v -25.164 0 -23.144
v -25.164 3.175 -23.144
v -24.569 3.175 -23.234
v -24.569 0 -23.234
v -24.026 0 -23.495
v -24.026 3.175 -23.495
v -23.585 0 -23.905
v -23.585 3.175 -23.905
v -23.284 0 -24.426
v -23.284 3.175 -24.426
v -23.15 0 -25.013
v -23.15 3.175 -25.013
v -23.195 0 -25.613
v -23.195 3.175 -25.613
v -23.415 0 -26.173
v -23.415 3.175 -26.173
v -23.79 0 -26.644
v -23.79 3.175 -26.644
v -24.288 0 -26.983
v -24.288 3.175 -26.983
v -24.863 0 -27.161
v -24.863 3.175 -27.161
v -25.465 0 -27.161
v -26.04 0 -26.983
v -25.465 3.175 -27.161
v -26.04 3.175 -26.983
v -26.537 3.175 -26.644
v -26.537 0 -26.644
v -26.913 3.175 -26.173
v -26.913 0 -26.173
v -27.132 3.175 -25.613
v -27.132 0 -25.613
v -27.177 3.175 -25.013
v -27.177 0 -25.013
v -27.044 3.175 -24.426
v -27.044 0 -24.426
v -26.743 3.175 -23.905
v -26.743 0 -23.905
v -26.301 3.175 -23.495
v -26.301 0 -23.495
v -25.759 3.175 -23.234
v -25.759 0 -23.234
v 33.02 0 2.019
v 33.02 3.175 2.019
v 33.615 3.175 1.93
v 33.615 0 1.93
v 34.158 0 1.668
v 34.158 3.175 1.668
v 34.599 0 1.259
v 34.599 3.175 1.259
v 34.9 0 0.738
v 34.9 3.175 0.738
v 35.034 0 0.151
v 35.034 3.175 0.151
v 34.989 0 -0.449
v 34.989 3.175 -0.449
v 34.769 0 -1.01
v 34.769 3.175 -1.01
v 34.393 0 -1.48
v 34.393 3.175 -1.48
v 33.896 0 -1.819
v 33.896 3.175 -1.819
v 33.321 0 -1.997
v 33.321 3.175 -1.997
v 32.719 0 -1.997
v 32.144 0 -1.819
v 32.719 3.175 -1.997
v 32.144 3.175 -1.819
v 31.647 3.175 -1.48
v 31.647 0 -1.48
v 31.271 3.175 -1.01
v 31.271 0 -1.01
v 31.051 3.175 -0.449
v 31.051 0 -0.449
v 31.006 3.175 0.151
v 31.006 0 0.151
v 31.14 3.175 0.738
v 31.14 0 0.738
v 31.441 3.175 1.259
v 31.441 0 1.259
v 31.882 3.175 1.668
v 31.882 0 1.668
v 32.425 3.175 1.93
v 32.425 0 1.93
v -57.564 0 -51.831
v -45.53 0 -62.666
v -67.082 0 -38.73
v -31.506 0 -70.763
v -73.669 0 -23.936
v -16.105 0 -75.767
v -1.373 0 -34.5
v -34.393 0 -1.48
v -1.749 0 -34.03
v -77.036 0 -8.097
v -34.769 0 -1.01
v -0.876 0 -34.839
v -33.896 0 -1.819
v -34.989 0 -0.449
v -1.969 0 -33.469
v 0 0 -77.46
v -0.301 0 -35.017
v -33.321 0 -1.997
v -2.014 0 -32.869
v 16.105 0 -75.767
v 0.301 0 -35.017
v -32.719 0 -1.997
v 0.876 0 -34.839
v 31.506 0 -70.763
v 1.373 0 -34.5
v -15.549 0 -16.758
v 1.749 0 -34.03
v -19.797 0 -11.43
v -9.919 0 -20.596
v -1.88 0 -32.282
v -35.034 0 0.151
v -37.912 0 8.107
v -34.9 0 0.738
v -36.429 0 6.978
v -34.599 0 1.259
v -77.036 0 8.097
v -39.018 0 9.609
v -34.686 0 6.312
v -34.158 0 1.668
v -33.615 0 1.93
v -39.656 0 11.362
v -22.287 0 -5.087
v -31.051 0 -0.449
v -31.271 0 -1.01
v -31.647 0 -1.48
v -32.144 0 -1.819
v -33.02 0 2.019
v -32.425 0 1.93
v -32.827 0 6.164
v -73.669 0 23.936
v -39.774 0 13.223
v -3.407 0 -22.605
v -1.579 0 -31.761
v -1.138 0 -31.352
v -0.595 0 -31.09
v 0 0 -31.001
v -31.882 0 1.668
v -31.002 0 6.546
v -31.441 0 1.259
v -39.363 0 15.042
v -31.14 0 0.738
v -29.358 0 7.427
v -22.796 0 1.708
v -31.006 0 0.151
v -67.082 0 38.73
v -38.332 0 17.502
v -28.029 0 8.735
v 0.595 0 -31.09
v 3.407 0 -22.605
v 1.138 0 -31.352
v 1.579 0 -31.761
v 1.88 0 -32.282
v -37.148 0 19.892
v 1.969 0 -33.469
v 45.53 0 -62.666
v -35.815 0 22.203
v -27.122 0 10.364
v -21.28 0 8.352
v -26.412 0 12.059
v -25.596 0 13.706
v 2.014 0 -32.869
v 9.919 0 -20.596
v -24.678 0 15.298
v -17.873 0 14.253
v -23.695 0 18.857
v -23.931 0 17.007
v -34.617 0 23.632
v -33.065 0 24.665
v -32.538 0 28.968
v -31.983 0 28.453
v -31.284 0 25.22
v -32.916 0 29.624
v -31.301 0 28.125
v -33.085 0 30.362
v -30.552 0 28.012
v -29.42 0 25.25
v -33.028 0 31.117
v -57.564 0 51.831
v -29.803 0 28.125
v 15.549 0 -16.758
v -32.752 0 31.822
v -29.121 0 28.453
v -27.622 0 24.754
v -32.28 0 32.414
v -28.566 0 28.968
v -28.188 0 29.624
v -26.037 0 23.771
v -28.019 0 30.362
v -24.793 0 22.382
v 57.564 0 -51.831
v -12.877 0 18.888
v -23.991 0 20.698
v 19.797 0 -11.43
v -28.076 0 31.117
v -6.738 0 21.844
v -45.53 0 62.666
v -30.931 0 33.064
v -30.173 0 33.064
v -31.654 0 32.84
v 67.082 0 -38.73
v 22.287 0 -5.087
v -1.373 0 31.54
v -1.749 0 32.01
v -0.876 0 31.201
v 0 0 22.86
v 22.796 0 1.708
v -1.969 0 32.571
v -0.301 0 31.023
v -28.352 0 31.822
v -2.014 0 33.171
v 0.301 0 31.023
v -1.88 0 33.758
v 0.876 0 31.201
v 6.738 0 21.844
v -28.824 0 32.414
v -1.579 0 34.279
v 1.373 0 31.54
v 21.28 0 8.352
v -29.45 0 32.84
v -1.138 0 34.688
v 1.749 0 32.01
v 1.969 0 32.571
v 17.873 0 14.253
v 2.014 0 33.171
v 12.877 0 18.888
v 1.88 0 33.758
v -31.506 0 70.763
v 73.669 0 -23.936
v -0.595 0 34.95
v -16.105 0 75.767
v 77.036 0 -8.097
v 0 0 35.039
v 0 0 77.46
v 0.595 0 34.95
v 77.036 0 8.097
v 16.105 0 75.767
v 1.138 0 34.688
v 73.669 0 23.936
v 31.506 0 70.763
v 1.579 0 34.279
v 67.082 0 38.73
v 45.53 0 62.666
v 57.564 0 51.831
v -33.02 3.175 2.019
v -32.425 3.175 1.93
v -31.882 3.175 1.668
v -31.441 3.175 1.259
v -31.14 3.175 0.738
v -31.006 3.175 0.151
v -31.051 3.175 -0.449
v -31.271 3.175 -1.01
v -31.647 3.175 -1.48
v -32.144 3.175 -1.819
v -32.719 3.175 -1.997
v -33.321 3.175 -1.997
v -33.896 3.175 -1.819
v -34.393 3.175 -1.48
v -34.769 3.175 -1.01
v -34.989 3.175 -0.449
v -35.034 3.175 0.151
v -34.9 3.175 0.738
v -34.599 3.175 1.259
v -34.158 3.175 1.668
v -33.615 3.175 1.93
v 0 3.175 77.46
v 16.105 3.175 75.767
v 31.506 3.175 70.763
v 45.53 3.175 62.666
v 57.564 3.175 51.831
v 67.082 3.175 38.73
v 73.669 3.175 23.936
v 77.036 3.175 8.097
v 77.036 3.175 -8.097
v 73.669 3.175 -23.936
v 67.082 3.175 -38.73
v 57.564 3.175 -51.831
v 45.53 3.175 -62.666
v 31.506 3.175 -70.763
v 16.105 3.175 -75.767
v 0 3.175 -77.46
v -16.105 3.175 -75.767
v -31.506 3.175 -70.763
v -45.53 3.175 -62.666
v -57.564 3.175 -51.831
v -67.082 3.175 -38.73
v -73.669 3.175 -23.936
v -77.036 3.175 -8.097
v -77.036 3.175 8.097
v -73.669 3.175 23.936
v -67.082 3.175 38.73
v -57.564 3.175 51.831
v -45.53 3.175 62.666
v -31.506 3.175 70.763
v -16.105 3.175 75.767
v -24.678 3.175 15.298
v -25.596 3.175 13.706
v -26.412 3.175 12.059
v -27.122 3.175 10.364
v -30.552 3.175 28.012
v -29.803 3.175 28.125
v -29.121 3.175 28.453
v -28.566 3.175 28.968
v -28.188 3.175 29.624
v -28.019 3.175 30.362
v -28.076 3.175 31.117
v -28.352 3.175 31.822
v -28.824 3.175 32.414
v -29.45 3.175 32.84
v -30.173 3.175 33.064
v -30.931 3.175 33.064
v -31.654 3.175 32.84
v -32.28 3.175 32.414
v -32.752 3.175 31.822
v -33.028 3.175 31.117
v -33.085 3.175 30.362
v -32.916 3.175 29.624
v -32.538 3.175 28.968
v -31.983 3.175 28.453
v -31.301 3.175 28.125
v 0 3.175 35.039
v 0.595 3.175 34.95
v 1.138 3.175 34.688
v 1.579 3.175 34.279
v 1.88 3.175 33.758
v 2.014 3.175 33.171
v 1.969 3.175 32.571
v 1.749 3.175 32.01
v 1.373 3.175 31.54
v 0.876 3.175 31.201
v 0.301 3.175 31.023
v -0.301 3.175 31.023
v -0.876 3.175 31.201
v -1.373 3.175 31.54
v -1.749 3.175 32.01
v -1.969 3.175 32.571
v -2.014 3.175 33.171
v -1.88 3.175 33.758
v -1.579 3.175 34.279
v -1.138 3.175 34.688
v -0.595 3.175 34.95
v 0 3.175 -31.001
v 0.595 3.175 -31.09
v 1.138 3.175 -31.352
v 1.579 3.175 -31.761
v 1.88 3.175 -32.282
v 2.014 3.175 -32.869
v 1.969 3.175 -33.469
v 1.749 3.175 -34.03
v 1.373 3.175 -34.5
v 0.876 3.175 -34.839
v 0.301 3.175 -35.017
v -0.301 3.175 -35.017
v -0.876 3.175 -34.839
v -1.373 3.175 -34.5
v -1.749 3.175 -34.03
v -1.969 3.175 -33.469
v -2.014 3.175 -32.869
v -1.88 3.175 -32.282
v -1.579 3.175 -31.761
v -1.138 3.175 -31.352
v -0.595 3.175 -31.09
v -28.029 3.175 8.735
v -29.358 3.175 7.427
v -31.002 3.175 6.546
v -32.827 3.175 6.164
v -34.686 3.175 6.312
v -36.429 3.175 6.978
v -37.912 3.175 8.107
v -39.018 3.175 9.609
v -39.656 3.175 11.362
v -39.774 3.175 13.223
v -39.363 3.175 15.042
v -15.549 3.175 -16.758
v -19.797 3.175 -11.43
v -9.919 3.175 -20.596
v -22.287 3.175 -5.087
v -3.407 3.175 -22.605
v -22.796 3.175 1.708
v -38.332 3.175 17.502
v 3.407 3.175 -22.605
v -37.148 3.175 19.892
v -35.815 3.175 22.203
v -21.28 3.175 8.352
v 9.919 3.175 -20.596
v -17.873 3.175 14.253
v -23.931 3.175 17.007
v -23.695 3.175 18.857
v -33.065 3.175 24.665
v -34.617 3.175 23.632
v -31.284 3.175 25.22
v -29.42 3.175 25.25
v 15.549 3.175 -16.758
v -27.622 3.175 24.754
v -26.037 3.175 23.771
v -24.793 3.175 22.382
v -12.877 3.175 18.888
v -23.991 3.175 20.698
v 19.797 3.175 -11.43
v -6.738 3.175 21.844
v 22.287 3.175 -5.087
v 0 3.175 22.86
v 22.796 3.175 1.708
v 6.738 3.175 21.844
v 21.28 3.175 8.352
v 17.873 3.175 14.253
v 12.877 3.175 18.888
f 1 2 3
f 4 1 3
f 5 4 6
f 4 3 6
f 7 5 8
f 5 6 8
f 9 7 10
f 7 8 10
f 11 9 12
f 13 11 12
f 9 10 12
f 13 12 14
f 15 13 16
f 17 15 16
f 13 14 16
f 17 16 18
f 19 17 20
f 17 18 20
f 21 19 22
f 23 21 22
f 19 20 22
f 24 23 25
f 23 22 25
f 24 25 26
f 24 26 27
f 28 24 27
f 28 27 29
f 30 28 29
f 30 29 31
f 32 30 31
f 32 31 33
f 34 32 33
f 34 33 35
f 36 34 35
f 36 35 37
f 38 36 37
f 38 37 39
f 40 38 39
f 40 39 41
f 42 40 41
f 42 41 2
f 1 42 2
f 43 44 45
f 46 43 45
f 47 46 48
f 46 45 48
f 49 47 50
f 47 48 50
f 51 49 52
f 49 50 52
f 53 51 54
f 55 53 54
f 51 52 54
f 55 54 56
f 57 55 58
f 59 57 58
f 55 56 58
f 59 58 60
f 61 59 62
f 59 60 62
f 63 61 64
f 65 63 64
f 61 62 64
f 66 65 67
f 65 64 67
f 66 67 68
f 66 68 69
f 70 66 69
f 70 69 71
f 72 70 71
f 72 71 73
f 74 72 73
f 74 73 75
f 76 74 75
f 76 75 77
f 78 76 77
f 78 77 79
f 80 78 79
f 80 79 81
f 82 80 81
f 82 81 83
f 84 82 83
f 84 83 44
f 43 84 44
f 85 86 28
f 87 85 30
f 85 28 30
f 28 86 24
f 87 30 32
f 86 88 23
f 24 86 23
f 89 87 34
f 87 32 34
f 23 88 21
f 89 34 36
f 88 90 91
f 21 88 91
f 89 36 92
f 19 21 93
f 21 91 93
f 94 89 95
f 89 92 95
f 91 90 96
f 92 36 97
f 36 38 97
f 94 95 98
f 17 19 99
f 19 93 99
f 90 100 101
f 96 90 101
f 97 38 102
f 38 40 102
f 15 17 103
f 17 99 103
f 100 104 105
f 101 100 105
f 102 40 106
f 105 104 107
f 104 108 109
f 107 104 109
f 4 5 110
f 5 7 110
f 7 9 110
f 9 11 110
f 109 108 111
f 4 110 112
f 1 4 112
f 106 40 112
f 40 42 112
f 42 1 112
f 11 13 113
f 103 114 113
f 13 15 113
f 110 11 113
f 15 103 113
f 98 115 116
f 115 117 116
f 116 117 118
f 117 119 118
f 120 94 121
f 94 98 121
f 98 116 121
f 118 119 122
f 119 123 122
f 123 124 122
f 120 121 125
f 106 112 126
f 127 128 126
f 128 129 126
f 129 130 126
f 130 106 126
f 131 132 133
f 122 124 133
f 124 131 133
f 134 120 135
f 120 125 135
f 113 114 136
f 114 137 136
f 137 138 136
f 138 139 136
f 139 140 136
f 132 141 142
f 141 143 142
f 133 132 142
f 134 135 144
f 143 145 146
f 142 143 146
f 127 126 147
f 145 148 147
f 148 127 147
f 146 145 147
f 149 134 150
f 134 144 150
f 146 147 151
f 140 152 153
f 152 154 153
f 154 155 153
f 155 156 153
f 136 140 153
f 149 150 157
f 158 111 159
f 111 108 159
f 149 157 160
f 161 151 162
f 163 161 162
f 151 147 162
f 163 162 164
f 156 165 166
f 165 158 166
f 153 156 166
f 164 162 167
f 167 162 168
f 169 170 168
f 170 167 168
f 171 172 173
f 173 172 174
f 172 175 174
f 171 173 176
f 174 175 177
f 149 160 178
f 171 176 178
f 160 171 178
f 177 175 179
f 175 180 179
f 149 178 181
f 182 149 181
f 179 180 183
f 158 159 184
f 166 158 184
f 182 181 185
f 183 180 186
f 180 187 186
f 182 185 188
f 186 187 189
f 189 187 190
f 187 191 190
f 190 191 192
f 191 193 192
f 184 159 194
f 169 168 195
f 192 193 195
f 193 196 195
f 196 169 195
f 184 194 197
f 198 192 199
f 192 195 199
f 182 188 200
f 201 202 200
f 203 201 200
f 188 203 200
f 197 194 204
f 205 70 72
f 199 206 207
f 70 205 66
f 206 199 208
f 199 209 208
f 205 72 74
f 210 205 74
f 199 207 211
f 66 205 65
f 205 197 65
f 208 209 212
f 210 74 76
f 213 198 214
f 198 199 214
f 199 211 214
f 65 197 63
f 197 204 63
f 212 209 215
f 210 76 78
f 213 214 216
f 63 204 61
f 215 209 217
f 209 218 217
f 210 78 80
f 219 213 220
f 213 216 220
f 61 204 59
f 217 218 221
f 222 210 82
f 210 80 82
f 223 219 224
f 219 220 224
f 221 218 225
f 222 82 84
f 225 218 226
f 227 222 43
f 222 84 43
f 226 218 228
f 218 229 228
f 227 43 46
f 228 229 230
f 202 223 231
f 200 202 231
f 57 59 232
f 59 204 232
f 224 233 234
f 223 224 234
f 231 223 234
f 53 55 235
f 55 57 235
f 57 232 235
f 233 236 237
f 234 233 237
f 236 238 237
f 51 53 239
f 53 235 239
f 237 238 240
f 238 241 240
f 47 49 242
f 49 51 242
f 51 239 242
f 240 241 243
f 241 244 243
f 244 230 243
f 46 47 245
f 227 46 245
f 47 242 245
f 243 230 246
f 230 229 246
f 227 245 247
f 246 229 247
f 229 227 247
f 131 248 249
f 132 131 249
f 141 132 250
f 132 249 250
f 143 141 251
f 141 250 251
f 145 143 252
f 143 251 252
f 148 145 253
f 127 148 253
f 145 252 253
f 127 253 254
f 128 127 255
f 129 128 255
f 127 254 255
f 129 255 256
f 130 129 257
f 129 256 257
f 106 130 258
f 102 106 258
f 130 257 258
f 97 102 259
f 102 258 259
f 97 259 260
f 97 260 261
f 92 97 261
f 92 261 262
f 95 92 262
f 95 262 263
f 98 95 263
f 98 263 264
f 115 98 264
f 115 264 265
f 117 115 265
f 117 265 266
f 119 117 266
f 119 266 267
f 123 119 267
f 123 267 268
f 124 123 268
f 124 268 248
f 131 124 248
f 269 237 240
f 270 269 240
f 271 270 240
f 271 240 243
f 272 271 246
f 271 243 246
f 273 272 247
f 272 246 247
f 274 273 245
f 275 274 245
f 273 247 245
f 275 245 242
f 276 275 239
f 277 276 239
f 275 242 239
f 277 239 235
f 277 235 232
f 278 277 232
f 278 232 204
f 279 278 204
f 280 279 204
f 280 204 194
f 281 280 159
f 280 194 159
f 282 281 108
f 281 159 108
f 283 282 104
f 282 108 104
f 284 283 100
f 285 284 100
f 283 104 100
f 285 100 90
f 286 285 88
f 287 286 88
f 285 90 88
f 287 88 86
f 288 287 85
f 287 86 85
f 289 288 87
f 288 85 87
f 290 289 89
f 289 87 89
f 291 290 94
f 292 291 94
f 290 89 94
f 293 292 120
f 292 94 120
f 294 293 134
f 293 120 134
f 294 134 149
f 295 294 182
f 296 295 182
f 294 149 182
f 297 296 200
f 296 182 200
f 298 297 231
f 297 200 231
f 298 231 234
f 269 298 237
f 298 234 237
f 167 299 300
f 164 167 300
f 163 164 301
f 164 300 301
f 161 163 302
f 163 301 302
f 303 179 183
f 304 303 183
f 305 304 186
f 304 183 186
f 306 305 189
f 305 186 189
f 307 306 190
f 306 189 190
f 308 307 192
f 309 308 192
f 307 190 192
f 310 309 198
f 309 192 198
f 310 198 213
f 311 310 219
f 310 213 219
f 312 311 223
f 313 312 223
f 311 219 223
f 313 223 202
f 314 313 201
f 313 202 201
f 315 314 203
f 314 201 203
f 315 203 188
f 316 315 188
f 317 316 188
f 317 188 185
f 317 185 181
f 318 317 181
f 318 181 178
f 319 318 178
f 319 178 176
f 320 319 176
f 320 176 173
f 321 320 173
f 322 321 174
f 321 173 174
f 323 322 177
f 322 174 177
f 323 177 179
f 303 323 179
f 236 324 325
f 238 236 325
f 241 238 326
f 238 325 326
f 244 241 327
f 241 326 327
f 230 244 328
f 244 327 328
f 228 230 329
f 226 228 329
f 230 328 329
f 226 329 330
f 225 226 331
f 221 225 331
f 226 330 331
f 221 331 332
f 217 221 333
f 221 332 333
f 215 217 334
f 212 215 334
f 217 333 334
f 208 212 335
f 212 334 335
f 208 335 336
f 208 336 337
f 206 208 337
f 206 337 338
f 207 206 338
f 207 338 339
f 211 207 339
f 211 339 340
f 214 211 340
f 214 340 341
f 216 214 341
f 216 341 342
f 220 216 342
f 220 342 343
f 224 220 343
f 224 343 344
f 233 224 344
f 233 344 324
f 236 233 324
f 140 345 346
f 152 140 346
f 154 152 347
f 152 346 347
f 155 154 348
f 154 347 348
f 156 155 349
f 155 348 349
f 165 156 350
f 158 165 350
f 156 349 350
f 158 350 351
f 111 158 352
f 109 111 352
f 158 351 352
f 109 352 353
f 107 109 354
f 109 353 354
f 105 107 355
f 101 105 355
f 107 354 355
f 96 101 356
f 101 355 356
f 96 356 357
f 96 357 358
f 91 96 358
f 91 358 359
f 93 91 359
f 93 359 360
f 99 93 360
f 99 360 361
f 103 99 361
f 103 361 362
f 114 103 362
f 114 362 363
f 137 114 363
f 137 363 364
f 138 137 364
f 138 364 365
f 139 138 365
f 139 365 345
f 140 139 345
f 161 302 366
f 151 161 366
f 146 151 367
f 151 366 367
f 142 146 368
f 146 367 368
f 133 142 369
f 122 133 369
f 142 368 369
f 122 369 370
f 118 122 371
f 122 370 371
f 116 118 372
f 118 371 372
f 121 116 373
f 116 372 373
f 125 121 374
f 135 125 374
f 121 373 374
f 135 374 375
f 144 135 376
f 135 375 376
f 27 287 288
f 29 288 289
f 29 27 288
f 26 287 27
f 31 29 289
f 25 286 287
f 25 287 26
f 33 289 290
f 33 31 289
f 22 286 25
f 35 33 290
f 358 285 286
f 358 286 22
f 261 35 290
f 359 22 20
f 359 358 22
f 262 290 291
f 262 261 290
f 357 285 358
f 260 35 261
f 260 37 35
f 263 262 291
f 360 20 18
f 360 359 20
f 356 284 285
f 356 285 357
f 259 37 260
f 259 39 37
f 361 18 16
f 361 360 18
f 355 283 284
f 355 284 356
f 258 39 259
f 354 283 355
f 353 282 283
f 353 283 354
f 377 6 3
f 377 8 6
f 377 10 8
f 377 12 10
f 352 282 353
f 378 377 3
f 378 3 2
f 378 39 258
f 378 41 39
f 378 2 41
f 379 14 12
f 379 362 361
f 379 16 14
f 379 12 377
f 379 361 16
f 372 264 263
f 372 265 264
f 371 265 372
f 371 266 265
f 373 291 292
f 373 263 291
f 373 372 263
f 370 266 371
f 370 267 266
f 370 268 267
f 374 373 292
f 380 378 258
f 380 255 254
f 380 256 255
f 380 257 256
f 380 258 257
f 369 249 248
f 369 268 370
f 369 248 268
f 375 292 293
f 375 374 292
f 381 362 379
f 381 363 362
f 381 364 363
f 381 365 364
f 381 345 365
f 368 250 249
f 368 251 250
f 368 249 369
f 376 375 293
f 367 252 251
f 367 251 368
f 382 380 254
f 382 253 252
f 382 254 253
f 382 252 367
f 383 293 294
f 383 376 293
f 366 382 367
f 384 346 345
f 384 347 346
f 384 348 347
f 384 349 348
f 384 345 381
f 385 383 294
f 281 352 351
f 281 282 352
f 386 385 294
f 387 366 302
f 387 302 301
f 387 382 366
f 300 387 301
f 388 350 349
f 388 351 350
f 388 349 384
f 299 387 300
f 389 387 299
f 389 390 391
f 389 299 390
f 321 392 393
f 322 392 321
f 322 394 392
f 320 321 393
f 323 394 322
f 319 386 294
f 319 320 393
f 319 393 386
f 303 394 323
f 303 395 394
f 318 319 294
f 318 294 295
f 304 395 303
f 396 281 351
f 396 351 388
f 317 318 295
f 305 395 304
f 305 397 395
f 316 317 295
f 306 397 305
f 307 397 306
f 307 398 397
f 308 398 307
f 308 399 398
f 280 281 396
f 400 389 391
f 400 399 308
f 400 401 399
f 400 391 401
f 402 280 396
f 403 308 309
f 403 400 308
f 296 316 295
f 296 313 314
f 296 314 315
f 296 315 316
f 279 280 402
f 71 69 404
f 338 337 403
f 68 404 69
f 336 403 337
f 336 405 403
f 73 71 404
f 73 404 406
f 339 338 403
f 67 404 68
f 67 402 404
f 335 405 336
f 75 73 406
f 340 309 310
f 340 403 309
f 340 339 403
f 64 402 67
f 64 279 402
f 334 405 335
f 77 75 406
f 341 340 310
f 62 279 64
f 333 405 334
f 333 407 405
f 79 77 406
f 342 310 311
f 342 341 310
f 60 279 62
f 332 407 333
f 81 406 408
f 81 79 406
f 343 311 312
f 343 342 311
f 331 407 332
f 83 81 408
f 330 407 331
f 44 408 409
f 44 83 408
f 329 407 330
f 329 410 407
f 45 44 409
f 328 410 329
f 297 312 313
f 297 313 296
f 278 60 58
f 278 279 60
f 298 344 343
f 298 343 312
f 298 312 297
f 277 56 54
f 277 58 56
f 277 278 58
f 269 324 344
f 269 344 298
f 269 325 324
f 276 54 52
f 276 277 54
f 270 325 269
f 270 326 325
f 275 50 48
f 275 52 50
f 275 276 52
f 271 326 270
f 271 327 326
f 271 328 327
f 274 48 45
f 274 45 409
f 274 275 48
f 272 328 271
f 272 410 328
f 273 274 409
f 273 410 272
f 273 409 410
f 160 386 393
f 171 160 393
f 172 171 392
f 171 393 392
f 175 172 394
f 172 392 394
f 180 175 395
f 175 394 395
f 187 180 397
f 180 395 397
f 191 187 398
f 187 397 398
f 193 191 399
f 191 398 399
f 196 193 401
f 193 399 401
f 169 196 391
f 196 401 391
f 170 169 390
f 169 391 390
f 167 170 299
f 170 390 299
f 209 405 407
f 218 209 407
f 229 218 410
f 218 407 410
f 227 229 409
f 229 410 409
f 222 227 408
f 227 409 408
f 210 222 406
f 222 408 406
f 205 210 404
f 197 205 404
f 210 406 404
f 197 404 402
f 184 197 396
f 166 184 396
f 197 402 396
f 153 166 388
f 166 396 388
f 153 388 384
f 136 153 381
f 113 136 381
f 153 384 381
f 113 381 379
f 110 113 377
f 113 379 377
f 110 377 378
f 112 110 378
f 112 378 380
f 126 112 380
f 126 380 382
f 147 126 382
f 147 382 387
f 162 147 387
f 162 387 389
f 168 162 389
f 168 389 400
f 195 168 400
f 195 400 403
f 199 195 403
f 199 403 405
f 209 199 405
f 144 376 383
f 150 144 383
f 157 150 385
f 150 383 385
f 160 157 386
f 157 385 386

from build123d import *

# Parameters (mm, degrees)
SKETCH1_R           = 77.4600051
BOSS_EXTRUDE1_DEPTH = 3.175
SKETCH20_R          = 22.86
SKETCH20_R_2        = 2.0193
CUT_EXTRUDE10_DEPTH = 251.865681086
SKETCH21_R          = 2.0193
CUT_EXTRUDE11_DEPTH = 251.865681086
CUT_EXTRUDE12_DEPTH = 251.865681086
SKETCH23_R          = 2.54
CUT_EXTRUDE13_DEPTH = 3.175


with BuildPart() as part:
    # Sketch1 → Boss-Extrude1 (new body)
    with BuildSketch(Plane(origin=(0, 0, 0), x_dir=(1, 0, 0), z_dir=(0, 1, 0))):
        with Locations(Location((0, 0, 0), (0, 0, 270))):
            Circle(SKETCH1_R)
    extrude(amount=BOSS_EXTRUDE1_DEPTH)

    # Sketch20 → Cut-Extrude10 (cut, through all)
    with BuildSketch(Plane(origin=(-73.768816189, 25.4, -121.080352405), x_dir=(1, 0, 0), z_dir=(0, 1, 0))):
        with Locations(Location((73.768816189, -121.080352405, 0), (0, 0, 270))):
            Circle(SKETCH20_R)
        with Locations(Location((73.768816189, -88.060352405, 0), (0, 0, 270))):
            Circle(SKETCH20_R_2)
        with Locations(Location((106.788816189, -121.080352405, 0), (0, 0, 270))):
            Circle(SKETCH20_R_2)
        with Locations(Location((73.768816189, -154.100352405, 0), (0, 0, 270))):
            Circle(SKETCH20_R_2)
        with Locations(Location((40.748816189, -121.080352405, 0), (0, 0, 270))):
            Circle(SKETCH20_R_2)
    extrude(amount=-CUT_EXTRUDE10_DEPTH, mode=Mode.SUBTRACT)

    # Sketch21 → Cut-Extrude11 (cut, through all)
    with BuildSketch(Plane(origin=(-73.768816189, 25.4, -121.080352405), x_dir=(1, 0, 0), z_dir=(0, 1, 0))):
        with Locations(Location((48.605023435, -95.916559651, 0), (0, 0, 270))):
            Circle(SKETCH21_R)
    extrude(amount=-CUT_EXTRUDE11_DEPTH, mode=Mode.SUBTRACT)

    # Sketch22 → Cut-Extrude12 (cut, through all)
    with BuildSketch(Plane(origin=(-73.768816189, 25.4, -121.080352405), x_dir=(1, 0, 0), z_dir=(0, 1, 0))):
        with BuildLine():
            ThreePointArc((34.405967979, -136.122213123), (36.00963526, -139.786919397), (37.953573181, -143.283049568))
            ThreePointArc((37.953573181, -143.283049568), (46.974494303, -145.399596657), (49.091041391, -136.378675534))
            ThreePointArc((49.091041391, -136.378675534), (47.751609959, -133.969737166), (46.646635186, -131.444644817))
            ThreePointArc((46.646635186, -131.444644817), (38.18751743, -127.663095366), (34.405967979, -136.122213123))
        make_face()
    extrude(amount=-CUT_EXTRUDE12_DEPTH, mode=Mode.SUBTRACT)

    # Sketch23 → Cut-Extrude13 (cut)
    with BuildSketch(Plane(origin=(-73.768816189, 0, -121.080352405), x_dir=(1, 0, 0), z_dir=(0, -1, 0))):
        with Locations(Location((43.216869762, 151.632298832, 0), (0, 0, 270))):
            Circle(SKETCH23_R)
    extrude(amount=-CUT_EXTRUDE13_DEPTH, mode=Mode.SUBTRACT)


solid = part.part
